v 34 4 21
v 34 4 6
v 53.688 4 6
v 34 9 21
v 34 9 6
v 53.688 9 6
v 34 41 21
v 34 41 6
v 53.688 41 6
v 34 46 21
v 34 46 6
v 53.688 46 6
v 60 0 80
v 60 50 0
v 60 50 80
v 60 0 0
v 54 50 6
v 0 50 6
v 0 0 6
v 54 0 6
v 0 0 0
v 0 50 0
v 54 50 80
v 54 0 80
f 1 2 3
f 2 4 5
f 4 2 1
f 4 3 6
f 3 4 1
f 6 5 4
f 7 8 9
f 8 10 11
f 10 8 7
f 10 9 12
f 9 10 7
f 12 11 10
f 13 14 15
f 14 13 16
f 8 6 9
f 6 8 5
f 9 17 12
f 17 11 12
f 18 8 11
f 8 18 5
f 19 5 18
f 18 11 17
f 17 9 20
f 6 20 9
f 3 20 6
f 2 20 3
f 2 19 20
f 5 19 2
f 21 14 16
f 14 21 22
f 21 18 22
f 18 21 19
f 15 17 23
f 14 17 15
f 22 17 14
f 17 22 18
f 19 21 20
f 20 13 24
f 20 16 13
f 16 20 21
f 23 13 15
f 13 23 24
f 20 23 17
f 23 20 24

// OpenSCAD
$fn = 32;

// ----------------------------------------------------------------------
// Rib bracket: 2-gusset L bracket
// ----------------------------------------------------------------------

// --- parameters (mm) ---
base_l = 60;              // foot length, X
base_w = 50;              // foot width, Y
base_t = 6;               // foot thickness
plate_t = 6;              // upright plate thickness
plate_h = 80;             // overall height
gus_l = 20;               // gusset leg along the foot
gus_h = 16;               // gusset height
gus_t = 5;                // gusset thickness
gus_edge = 4;             // gusset margin from the foot edge
n_gus = 2;                // gusset count

gus_pitch = (base_w - 2 * gus_edge - gus_t) / (n_gus - 1);  // gusset pitch

union() {
  cube([base_l, base_w, base_t]);
  translate([base_l - plate_t, 0, base_t - 1])
    cube([plate_t, base_w, plate_h - base_t + 1]);
  for (i = [0 : n_gus - 1])
    translate([base_l - plate_t - gus_l, gus_edge + i * gus_pitch, base_t - 1])
      rotate([-90, 0, 0])
        linear_extrude(height = gus_t)
          polygon(points = [[0, 0], [gus_l + 1, 0], [0, -gus_h]]);
}
